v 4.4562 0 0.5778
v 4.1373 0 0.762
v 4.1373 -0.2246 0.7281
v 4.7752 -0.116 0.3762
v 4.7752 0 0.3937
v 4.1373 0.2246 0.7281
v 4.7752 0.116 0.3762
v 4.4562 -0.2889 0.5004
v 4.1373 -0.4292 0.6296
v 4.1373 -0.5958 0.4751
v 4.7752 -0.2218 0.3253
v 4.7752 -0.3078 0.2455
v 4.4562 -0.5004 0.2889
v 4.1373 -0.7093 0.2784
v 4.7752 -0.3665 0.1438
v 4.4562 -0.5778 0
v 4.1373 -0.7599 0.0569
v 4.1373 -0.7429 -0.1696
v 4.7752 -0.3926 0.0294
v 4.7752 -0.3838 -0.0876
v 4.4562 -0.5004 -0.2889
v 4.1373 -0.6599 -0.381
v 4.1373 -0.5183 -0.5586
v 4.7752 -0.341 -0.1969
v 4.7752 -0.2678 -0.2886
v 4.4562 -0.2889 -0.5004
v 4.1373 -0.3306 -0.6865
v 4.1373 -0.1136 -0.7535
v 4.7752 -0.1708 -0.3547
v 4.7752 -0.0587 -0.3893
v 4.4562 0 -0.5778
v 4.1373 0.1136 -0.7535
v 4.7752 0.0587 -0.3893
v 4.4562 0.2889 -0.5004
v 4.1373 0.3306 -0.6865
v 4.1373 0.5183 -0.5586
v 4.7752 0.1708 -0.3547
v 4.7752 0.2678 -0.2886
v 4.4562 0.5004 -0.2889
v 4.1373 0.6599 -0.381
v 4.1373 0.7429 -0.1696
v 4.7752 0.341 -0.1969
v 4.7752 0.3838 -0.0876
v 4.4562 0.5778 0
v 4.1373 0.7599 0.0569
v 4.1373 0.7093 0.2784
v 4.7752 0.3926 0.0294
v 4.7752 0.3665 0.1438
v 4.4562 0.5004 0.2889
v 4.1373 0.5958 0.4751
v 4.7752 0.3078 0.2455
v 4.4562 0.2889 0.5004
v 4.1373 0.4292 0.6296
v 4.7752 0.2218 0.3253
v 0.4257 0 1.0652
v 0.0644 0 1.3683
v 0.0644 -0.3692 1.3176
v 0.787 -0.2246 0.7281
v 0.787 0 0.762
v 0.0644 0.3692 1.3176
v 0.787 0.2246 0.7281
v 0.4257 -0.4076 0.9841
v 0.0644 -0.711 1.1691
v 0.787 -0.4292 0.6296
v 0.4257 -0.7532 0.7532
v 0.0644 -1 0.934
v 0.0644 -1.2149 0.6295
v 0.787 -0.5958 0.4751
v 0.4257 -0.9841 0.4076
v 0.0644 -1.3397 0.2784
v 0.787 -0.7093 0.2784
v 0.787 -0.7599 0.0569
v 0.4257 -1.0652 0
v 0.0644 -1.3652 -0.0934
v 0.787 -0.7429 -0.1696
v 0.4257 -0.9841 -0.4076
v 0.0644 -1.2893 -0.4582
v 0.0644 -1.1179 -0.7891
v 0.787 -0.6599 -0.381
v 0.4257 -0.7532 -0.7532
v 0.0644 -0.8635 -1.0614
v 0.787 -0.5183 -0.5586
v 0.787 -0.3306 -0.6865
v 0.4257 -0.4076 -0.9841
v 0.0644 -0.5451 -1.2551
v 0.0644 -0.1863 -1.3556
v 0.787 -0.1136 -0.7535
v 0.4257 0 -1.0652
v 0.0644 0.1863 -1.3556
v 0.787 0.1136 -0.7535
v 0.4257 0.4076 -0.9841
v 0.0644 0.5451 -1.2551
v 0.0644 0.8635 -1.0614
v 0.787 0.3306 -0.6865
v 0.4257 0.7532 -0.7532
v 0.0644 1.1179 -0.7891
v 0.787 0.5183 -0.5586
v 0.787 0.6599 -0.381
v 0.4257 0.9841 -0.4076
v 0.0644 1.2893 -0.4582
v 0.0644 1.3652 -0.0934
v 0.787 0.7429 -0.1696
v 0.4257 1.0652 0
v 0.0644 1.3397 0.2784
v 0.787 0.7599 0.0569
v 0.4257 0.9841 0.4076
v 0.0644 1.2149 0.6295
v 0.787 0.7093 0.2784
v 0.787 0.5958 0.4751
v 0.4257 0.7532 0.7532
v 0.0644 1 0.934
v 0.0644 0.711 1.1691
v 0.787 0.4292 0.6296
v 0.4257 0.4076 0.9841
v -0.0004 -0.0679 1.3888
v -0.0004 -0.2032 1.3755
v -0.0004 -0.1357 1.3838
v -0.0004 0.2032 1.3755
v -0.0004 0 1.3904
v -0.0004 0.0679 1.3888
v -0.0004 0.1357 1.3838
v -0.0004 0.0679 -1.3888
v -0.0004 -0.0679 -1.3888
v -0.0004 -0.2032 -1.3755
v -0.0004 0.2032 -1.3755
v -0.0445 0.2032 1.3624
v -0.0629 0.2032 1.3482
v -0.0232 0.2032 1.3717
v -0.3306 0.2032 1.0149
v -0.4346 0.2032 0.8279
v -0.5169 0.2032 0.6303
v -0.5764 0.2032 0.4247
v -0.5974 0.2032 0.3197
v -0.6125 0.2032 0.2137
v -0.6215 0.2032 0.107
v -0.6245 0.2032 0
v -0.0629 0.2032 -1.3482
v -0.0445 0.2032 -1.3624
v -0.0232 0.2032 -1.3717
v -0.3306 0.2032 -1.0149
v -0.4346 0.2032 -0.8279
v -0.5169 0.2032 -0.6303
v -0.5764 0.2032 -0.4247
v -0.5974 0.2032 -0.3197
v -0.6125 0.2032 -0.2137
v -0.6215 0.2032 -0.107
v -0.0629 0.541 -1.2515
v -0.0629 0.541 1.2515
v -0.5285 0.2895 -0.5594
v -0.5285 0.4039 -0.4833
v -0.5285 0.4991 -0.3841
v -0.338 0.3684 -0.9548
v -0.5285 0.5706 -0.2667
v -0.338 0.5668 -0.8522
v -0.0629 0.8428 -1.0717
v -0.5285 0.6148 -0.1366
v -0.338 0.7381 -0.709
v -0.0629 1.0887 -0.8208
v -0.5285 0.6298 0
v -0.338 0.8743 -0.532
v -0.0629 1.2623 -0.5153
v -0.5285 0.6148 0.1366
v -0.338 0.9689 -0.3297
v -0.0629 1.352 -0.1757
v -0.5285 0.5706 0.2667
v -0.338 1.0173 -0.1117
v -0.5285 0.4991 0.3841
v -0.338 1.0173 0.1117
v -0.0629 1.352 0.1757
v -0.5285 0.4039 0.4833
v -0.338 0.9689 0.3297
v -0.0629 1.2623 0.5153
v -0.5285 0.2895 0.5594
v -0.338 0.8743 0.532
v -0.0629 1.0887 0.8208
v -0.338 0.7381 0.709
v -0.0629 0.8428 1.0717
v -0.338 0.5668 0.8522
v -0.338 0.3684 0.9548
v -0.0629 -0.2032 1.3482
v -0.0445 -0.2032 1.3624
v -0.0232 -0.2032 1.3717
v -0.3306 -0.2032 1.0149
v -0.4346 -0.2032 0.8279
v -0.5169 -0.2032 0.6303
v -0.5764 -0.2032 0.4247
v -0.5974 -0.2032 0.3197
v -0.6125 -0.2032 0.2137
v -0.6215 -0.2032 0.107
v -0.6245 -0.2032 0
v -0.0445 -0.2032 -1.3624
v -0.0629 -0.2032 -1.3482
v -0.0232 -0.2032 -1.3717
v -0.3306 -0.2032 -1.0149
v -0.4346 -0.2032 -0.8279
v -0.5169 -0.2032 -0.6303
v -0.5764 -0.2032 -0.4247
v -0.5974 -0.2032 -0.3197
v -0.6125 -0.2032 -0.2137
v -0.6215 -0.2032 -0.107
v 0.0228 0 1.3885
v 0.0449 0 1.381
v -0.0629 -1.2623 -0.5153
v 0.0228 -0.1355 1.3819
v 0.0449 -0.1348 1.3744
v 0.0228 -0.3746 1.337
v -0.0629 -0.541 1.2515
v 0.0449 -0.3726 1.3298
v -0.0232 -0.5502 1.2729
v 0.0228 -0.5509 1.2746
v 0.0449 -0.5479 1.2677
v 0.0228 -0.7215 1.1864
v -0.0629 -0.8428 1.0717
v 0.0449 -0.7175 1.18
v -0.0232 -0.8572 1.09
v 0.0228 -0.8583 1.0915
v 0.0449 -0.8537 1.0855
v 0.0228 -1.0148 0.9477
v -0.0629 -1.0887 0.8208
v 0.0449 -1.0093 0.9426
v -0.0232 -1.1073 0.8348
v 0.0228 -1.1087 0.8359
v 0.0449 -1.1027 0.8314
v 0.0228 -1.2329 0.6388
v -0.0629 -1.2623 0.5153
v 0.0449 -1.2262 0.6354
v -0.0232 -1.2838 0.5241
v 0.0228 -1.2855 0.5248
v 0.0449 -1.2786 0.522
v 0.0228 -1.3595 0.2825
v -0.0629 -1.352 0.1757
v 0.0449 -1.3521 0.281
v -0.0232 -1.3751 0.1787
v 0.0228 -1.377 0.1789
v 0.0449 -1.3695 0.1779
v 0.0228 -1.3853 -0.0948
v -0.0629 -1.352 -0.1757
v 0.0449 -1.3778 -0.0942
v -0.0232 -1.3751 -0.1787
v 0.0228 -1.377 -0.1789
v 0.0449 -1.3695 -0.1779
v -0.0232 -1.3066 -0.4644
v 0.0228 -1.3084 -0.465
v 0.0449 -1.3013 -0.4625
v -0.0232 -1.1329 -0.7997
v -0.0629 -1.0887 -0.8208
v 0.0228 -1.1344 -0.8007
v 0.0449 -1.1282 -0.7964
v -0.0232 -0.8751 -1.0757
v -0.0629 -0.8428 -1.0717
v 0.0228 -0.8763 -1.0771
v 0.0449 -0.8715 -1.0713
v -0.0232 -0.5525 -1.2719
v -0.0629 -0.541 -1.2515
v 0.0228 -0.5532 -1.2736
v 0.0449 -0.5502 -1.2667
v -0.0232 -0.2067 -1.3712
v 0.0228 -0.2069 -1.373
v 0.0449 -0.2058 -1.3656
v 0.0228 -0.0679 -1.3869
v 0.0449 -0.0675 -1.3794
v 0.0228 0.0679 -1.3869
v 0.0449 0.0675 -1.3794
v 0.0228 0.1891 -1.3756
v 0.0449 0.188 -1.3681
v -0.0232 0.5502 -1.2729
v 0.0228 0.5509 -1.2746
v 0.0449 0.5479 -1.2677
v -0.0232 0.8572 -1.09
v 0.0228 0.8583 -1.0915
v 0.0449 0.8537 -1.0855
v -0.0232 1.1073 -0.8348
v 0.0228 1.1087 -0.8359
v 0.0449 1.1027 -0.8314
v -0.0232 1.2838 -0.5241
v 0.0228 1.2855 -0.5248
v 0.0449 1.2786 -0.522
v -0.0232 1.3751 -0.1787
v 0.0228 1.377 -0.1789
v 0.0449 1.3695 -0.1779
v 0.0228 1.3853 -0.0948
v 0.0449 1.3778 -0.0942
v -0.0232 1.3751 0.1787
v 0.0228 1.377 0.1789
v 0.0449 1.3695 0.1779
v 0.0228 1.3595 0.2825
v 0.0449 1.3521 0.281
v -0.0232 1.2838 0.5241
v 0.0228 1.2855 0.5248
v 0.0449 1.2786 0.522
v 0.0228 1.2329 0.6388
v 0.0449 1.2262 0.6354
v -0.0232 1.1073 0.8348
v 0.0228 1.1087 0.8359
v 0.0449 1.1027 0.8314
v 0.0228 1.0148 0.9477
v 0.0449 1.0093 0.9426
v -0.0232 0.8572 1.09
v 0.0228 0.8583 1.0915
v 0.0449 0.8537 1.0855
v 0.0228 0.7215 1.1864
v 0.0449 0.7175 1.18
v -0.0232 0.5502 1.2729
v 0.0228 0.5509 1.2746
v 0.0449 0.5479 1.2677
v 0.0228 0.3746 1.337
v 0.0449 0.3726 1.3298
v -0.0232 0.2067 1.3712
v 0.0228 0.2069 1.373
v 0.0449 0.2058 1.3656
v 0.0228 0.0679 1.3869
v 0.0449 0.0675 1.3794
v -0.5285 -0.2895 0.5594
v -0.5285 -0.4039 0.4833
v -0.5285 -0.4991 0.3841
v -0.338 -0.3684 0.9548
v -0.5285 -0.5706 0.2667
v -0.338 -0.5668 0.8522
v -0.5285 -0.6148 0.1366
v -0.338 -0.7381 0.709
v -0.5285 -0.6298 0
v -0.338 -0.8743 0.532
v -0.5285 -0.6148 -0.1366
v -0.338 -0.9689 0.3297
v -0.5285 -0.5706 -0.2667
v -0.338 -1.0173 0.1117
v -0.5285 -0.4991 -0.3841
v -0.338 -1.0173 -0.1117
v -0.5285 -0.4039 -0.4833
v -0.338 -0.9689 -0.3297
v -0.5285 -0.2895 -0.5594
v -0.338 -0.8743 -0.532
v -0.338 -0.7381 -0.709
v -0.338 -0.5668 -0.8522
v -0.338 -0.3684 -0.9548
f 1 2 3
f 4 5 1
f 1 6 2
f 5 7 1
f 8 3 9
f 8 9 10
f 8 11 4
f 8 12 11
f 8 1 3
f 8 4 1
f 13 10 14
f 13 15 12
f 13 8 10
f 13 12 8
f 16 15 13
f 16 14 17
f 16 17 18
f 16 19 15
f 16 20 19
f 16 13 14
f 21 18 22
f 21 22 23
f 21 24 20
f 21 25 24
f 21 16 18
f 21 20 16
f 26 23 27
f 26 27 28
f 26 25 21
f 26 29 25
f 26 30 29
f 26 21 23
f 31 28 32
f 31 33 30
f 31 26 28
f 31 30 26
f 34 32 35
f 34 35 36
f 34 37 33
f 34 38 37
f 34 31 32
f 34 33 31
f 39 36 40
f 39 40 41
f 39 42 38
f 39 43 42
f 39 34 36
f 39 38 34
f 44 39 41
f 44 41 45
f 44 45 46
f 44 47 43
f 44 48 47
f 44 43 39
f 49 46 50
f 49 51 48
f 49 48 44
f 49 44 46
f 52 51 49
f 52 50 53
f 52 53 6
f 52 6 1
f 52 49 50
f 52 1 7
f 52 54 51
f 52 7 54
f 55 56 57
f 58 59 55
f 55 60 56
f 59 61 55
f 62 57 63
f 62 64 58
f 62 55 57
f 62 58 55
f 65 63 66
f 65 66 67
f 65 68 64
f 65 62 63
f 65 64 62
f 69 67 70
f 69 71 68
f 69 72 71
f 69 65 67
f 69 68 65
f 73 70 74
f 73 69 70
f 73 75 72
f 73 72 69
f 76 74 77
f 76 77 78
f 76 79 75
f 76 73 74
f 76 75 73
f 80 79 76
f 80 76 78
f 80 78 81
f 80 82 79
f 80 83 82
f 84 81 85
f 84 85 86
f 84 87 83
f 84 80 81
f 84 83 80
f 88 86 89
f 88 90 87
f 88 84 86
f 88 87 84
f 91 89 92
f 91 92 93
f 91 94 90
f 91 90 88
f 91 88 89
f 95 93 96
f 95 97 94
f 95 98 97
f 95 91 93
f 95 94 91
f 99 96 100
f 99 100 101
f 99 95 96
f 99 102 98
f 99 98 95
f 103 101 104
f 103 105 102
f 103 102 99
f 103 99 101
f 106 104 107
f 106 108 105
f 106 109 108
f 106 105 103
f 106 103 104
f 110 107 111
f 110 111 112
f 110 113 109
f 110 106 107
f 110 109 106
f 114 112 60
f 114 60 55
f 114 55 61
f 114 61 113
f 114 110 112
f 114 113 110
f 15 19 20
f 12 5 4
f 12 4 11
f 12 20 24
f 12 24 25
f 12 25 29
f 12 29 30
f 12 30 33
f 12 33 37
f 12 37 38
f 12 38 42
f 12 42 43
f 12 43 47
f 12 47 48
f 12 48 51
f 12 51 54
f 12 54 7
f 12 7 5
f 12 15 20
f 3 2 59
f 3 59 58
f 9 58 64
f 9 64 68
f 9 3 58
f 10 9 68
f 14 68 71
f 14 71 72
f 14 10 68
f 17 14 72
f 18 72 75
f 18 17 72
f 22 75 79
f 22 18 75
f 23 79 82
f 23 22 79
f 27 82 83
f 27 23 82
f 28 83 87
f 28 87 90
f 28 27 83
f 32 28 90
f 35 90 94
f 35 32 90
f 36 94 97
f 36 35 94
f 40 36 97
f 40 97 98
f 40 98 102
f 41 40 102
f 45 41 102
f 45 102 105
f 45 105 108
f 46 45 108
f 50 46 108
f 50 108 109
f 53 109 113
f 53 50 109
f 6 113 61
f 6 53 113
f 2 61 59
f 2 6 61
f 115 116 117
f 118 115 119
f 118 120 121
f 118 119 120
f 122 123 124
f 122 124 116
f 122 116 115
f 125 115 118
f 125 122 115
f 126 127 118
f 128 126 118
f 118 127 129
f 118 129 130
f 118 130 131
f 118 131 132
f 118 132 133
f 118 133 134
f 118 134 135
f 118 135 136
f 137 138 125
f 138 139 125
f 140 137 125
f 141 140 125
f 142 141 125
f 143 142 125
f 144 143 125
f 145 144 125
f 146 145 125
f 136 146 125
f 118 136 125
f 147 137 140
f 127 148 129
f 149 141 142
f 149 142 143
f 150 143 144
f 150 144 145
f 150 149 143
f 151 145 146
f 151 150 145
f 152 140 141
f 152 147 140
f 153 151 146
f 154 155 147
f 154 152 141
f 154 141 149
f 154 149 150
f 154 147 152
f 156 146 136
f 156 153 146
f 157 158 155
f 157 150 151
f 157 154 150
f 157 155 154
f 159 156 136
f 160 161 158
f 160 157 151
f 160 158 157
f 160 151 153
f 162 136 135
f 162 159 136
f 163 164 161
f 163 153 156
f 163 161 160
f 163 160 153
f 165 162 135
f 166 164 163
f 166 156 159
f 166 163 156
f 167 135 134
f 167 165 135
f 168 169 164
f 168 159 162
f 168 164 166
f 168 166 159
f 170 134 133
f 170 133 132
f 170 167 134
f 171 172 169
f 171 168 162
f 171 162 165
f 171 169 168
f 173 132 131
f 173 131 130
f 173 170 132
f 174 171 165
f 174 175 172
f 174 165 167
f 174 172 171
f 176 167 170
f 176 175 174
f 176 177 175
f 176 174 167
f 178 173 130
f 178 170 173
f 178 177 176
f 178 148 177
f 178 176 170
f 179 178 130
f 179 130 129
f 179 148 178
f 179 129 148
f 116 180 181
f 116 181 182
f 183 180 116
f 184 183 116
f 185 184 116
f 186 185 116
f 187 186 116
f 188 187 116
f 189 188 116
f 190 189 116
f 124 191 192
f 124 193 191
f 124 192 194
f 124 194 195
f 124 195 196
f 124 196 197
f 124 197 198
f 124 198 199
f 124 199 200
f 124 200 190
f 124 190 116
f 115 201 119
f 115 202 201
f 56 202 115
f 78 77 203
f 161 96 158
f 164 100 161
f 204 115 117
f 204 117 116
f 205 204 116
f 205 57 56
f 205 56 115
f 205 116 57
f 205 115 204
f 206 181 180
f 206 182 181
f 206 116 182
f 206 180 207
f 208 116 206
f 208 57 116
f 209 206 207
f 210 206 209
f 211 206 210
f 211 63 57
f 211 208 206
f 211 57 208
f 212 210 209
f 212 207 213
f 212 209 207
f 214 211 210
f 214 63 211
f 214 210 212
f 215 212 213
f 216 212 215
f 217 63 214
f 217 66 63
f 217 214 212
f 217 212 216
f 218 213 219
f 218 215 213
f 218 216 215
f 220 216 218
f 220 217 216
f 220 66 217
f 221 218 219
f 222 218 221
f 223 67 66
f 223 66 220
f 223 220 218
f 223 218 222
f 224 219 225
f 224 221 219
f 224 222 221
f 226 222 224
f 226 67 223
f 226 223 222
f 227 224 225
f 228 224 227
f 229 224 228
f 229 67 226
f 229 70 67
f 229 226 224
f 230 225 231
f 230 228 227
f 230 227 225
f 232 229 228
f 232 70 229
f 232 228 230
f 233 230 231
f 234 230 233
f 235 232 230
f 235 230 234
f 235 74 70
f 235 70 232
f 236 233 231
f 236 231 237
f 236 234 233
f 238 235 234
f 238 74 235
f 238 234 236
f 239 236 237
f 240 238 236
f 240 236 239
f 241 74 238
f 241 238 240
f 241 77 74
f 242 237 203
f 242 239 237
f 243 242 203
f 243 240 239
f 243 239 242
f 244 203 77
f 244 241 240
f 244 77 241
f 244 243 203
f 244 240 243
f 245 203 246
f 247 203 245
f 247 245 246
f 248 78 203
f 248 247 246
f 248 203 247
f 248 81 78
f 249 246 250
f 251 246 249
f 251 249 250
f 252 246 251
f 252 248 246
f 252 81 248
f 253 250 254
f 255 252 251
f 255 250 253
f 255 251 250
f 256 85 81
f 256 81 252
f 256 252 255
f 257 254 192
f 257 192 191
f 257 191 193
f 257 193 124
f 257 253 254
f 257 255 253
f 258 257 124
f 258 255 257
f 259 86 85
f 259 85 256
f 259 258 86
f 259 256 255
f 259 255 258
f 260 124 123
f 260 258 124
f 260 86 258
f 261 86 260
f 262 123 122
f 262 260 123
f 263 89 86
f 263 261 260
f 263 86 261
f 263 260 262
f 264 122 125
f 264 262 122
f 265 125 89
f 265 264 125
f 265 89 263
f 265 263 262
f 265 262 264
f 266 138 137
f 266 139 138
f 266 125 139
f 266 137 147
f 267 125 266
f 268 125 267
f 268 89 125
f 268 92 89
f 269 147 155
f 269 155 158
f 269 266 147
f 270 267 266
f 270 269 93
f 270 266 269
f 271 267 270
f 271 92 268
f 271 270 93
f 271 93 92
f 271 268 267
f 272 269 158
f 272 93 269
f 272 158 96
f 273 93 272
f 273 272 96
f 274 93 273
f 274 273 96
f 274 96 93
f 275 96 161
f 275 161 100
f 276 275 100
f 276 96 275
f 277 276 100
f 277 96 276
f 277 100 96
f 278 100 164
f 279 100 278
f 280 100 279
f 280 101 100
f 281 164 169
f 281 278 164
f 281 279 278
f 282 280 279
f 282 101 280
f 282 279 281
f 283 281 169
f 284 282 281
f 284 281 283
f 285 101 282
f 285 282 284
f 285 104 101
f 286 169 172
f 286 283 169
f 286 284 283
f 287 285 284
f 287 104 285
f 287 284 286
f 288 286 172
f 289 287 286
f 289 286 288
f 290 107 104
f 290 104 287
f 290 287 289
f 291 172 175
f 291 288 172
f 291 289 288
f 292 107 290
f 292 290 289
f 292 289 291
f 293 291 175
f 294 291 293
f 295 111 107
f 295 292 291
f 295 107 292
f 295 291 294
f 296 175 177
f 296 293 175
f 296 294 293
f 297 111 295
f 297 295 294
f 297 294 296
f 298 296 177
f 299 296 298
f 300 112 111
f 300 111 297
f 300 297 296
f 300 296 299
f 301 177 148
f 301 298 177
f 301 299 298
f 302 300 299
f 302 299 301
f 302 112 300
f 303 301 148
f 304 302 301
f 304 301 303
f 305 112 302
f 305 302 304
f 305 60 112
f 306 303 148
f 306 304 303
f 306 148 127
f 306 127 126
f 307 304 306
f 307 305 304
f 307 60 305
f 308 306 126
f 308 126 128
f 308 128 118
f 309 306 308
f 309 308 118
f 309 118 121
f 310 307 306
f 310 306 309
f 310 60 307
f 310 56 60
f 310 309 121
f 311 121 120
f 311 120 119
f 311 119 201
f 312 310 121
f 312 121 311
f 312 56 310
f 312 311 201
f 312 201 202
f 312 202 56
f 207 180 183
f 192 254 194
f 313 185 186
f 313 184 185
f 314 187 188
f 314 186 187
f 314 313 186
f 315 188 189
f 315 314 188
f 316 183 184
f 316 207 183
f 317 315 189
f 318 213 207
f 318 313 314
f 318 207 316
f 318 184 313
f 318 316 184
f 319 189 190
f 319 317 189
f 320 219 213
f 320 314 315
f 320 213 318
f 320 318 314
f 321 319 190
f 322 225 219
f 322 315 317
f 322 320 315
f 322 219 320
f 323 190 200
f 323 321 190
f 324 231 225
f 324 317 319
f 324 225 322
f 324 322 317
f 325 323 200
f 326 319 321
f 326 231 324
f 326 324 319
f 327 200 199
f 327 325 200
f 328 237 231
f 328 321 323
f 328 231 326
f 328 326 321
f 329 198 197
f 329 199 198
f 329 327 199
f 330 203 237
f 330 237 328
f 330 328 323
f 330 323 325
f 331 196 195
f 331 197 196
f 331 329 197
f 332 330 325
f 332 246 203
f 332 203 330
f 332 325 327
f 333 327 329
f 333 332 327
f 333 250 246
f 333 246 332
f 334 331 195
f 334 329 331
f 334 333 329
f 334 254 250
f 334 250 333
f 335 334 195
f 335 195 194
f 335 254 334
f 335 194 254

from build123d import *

# Parameters (mm, degrees)
SLOT_CUT_EXTRUDE1_DEPTH      = 6.164268132
SLOT_CUT_EXTRUDE1_DEPTH_BACK = 6.164268132
SKETCH2_W                    = 0.635
SKETCH2_H                    = 0.4064


with BuildPart() as part:
    # Sketch1 → base-Revolve (revolve)
    with BuildSketch(Plane.XY, mode=Mode.PRIVATE) as base_revolve_sk:
        with BuildLine():
            Line((0.064424285, 1.368341606), (0.787034073, 0.762))
            Line((0.787034073, 0.762), (4.7752, 0.762))
            Line((4.7752, 0.762), (4.7752, 0))
            Line((4.7752, 0), (0, 0))
            Line((0, 0), (-0.635365927, 0))
            ThreePointArc((-0.635365927, 0), (-0.486452415, 0.739344802), (-0.062933801, 1.363394443))
            ThreePointArc((-0.062933801, 1.363394443), (-0.000209842, 1.390455371), (0.064424285, 1.368341606))
        make_face()
    revolve(base_revolve_sk.sketch.rotate(Axis((0, 0, 0), (1, 0, 0)), 90), axis=Axis((0, 0, 0), (1, 0, 0)))

    # Sketch2 → slot_Cut-Extrude1 (cut, two sides: drawn at the far end of the back side and taken through both)
    with BuildSketch(Plane.XY.offset(-SLOT_CUT_EXTRUDE1_DEPTH_BACK)):
        with Locations((-0.317865927, 0)):
            Rectangle(SKETCH2_W, SKETCH2_H)
    extrude(amount=SLOT_CUT_EXTRUDE1_DEPTH + SLOT_CUT_EXTRUDE1_DEPTH_BACK, mode=Mode.SUBTRACT)

    # Sketch8 → point_Cut-Revolve1 (revolve, cut)
    with BuildSketch(Plane.XY, mode=Mode.PRIVATE) as point_cut_revolve1_sk:
        Polygon((4.7752, 0), (5.2832, 0), (5.2832, 1.27), (4.137285688, 1.27), (4.137285688, 0.762), (4.7752, 0.3937), align=None)
    revolve(point_cut_revolve1_sk.sketch.rotate(Axis((0, 0, 0), (1, 0, 0)), 90), axis=Axis((0, 0, 0), (1, 0, 0)), mode=Mode.SUBTRACT)


solid = part.part
